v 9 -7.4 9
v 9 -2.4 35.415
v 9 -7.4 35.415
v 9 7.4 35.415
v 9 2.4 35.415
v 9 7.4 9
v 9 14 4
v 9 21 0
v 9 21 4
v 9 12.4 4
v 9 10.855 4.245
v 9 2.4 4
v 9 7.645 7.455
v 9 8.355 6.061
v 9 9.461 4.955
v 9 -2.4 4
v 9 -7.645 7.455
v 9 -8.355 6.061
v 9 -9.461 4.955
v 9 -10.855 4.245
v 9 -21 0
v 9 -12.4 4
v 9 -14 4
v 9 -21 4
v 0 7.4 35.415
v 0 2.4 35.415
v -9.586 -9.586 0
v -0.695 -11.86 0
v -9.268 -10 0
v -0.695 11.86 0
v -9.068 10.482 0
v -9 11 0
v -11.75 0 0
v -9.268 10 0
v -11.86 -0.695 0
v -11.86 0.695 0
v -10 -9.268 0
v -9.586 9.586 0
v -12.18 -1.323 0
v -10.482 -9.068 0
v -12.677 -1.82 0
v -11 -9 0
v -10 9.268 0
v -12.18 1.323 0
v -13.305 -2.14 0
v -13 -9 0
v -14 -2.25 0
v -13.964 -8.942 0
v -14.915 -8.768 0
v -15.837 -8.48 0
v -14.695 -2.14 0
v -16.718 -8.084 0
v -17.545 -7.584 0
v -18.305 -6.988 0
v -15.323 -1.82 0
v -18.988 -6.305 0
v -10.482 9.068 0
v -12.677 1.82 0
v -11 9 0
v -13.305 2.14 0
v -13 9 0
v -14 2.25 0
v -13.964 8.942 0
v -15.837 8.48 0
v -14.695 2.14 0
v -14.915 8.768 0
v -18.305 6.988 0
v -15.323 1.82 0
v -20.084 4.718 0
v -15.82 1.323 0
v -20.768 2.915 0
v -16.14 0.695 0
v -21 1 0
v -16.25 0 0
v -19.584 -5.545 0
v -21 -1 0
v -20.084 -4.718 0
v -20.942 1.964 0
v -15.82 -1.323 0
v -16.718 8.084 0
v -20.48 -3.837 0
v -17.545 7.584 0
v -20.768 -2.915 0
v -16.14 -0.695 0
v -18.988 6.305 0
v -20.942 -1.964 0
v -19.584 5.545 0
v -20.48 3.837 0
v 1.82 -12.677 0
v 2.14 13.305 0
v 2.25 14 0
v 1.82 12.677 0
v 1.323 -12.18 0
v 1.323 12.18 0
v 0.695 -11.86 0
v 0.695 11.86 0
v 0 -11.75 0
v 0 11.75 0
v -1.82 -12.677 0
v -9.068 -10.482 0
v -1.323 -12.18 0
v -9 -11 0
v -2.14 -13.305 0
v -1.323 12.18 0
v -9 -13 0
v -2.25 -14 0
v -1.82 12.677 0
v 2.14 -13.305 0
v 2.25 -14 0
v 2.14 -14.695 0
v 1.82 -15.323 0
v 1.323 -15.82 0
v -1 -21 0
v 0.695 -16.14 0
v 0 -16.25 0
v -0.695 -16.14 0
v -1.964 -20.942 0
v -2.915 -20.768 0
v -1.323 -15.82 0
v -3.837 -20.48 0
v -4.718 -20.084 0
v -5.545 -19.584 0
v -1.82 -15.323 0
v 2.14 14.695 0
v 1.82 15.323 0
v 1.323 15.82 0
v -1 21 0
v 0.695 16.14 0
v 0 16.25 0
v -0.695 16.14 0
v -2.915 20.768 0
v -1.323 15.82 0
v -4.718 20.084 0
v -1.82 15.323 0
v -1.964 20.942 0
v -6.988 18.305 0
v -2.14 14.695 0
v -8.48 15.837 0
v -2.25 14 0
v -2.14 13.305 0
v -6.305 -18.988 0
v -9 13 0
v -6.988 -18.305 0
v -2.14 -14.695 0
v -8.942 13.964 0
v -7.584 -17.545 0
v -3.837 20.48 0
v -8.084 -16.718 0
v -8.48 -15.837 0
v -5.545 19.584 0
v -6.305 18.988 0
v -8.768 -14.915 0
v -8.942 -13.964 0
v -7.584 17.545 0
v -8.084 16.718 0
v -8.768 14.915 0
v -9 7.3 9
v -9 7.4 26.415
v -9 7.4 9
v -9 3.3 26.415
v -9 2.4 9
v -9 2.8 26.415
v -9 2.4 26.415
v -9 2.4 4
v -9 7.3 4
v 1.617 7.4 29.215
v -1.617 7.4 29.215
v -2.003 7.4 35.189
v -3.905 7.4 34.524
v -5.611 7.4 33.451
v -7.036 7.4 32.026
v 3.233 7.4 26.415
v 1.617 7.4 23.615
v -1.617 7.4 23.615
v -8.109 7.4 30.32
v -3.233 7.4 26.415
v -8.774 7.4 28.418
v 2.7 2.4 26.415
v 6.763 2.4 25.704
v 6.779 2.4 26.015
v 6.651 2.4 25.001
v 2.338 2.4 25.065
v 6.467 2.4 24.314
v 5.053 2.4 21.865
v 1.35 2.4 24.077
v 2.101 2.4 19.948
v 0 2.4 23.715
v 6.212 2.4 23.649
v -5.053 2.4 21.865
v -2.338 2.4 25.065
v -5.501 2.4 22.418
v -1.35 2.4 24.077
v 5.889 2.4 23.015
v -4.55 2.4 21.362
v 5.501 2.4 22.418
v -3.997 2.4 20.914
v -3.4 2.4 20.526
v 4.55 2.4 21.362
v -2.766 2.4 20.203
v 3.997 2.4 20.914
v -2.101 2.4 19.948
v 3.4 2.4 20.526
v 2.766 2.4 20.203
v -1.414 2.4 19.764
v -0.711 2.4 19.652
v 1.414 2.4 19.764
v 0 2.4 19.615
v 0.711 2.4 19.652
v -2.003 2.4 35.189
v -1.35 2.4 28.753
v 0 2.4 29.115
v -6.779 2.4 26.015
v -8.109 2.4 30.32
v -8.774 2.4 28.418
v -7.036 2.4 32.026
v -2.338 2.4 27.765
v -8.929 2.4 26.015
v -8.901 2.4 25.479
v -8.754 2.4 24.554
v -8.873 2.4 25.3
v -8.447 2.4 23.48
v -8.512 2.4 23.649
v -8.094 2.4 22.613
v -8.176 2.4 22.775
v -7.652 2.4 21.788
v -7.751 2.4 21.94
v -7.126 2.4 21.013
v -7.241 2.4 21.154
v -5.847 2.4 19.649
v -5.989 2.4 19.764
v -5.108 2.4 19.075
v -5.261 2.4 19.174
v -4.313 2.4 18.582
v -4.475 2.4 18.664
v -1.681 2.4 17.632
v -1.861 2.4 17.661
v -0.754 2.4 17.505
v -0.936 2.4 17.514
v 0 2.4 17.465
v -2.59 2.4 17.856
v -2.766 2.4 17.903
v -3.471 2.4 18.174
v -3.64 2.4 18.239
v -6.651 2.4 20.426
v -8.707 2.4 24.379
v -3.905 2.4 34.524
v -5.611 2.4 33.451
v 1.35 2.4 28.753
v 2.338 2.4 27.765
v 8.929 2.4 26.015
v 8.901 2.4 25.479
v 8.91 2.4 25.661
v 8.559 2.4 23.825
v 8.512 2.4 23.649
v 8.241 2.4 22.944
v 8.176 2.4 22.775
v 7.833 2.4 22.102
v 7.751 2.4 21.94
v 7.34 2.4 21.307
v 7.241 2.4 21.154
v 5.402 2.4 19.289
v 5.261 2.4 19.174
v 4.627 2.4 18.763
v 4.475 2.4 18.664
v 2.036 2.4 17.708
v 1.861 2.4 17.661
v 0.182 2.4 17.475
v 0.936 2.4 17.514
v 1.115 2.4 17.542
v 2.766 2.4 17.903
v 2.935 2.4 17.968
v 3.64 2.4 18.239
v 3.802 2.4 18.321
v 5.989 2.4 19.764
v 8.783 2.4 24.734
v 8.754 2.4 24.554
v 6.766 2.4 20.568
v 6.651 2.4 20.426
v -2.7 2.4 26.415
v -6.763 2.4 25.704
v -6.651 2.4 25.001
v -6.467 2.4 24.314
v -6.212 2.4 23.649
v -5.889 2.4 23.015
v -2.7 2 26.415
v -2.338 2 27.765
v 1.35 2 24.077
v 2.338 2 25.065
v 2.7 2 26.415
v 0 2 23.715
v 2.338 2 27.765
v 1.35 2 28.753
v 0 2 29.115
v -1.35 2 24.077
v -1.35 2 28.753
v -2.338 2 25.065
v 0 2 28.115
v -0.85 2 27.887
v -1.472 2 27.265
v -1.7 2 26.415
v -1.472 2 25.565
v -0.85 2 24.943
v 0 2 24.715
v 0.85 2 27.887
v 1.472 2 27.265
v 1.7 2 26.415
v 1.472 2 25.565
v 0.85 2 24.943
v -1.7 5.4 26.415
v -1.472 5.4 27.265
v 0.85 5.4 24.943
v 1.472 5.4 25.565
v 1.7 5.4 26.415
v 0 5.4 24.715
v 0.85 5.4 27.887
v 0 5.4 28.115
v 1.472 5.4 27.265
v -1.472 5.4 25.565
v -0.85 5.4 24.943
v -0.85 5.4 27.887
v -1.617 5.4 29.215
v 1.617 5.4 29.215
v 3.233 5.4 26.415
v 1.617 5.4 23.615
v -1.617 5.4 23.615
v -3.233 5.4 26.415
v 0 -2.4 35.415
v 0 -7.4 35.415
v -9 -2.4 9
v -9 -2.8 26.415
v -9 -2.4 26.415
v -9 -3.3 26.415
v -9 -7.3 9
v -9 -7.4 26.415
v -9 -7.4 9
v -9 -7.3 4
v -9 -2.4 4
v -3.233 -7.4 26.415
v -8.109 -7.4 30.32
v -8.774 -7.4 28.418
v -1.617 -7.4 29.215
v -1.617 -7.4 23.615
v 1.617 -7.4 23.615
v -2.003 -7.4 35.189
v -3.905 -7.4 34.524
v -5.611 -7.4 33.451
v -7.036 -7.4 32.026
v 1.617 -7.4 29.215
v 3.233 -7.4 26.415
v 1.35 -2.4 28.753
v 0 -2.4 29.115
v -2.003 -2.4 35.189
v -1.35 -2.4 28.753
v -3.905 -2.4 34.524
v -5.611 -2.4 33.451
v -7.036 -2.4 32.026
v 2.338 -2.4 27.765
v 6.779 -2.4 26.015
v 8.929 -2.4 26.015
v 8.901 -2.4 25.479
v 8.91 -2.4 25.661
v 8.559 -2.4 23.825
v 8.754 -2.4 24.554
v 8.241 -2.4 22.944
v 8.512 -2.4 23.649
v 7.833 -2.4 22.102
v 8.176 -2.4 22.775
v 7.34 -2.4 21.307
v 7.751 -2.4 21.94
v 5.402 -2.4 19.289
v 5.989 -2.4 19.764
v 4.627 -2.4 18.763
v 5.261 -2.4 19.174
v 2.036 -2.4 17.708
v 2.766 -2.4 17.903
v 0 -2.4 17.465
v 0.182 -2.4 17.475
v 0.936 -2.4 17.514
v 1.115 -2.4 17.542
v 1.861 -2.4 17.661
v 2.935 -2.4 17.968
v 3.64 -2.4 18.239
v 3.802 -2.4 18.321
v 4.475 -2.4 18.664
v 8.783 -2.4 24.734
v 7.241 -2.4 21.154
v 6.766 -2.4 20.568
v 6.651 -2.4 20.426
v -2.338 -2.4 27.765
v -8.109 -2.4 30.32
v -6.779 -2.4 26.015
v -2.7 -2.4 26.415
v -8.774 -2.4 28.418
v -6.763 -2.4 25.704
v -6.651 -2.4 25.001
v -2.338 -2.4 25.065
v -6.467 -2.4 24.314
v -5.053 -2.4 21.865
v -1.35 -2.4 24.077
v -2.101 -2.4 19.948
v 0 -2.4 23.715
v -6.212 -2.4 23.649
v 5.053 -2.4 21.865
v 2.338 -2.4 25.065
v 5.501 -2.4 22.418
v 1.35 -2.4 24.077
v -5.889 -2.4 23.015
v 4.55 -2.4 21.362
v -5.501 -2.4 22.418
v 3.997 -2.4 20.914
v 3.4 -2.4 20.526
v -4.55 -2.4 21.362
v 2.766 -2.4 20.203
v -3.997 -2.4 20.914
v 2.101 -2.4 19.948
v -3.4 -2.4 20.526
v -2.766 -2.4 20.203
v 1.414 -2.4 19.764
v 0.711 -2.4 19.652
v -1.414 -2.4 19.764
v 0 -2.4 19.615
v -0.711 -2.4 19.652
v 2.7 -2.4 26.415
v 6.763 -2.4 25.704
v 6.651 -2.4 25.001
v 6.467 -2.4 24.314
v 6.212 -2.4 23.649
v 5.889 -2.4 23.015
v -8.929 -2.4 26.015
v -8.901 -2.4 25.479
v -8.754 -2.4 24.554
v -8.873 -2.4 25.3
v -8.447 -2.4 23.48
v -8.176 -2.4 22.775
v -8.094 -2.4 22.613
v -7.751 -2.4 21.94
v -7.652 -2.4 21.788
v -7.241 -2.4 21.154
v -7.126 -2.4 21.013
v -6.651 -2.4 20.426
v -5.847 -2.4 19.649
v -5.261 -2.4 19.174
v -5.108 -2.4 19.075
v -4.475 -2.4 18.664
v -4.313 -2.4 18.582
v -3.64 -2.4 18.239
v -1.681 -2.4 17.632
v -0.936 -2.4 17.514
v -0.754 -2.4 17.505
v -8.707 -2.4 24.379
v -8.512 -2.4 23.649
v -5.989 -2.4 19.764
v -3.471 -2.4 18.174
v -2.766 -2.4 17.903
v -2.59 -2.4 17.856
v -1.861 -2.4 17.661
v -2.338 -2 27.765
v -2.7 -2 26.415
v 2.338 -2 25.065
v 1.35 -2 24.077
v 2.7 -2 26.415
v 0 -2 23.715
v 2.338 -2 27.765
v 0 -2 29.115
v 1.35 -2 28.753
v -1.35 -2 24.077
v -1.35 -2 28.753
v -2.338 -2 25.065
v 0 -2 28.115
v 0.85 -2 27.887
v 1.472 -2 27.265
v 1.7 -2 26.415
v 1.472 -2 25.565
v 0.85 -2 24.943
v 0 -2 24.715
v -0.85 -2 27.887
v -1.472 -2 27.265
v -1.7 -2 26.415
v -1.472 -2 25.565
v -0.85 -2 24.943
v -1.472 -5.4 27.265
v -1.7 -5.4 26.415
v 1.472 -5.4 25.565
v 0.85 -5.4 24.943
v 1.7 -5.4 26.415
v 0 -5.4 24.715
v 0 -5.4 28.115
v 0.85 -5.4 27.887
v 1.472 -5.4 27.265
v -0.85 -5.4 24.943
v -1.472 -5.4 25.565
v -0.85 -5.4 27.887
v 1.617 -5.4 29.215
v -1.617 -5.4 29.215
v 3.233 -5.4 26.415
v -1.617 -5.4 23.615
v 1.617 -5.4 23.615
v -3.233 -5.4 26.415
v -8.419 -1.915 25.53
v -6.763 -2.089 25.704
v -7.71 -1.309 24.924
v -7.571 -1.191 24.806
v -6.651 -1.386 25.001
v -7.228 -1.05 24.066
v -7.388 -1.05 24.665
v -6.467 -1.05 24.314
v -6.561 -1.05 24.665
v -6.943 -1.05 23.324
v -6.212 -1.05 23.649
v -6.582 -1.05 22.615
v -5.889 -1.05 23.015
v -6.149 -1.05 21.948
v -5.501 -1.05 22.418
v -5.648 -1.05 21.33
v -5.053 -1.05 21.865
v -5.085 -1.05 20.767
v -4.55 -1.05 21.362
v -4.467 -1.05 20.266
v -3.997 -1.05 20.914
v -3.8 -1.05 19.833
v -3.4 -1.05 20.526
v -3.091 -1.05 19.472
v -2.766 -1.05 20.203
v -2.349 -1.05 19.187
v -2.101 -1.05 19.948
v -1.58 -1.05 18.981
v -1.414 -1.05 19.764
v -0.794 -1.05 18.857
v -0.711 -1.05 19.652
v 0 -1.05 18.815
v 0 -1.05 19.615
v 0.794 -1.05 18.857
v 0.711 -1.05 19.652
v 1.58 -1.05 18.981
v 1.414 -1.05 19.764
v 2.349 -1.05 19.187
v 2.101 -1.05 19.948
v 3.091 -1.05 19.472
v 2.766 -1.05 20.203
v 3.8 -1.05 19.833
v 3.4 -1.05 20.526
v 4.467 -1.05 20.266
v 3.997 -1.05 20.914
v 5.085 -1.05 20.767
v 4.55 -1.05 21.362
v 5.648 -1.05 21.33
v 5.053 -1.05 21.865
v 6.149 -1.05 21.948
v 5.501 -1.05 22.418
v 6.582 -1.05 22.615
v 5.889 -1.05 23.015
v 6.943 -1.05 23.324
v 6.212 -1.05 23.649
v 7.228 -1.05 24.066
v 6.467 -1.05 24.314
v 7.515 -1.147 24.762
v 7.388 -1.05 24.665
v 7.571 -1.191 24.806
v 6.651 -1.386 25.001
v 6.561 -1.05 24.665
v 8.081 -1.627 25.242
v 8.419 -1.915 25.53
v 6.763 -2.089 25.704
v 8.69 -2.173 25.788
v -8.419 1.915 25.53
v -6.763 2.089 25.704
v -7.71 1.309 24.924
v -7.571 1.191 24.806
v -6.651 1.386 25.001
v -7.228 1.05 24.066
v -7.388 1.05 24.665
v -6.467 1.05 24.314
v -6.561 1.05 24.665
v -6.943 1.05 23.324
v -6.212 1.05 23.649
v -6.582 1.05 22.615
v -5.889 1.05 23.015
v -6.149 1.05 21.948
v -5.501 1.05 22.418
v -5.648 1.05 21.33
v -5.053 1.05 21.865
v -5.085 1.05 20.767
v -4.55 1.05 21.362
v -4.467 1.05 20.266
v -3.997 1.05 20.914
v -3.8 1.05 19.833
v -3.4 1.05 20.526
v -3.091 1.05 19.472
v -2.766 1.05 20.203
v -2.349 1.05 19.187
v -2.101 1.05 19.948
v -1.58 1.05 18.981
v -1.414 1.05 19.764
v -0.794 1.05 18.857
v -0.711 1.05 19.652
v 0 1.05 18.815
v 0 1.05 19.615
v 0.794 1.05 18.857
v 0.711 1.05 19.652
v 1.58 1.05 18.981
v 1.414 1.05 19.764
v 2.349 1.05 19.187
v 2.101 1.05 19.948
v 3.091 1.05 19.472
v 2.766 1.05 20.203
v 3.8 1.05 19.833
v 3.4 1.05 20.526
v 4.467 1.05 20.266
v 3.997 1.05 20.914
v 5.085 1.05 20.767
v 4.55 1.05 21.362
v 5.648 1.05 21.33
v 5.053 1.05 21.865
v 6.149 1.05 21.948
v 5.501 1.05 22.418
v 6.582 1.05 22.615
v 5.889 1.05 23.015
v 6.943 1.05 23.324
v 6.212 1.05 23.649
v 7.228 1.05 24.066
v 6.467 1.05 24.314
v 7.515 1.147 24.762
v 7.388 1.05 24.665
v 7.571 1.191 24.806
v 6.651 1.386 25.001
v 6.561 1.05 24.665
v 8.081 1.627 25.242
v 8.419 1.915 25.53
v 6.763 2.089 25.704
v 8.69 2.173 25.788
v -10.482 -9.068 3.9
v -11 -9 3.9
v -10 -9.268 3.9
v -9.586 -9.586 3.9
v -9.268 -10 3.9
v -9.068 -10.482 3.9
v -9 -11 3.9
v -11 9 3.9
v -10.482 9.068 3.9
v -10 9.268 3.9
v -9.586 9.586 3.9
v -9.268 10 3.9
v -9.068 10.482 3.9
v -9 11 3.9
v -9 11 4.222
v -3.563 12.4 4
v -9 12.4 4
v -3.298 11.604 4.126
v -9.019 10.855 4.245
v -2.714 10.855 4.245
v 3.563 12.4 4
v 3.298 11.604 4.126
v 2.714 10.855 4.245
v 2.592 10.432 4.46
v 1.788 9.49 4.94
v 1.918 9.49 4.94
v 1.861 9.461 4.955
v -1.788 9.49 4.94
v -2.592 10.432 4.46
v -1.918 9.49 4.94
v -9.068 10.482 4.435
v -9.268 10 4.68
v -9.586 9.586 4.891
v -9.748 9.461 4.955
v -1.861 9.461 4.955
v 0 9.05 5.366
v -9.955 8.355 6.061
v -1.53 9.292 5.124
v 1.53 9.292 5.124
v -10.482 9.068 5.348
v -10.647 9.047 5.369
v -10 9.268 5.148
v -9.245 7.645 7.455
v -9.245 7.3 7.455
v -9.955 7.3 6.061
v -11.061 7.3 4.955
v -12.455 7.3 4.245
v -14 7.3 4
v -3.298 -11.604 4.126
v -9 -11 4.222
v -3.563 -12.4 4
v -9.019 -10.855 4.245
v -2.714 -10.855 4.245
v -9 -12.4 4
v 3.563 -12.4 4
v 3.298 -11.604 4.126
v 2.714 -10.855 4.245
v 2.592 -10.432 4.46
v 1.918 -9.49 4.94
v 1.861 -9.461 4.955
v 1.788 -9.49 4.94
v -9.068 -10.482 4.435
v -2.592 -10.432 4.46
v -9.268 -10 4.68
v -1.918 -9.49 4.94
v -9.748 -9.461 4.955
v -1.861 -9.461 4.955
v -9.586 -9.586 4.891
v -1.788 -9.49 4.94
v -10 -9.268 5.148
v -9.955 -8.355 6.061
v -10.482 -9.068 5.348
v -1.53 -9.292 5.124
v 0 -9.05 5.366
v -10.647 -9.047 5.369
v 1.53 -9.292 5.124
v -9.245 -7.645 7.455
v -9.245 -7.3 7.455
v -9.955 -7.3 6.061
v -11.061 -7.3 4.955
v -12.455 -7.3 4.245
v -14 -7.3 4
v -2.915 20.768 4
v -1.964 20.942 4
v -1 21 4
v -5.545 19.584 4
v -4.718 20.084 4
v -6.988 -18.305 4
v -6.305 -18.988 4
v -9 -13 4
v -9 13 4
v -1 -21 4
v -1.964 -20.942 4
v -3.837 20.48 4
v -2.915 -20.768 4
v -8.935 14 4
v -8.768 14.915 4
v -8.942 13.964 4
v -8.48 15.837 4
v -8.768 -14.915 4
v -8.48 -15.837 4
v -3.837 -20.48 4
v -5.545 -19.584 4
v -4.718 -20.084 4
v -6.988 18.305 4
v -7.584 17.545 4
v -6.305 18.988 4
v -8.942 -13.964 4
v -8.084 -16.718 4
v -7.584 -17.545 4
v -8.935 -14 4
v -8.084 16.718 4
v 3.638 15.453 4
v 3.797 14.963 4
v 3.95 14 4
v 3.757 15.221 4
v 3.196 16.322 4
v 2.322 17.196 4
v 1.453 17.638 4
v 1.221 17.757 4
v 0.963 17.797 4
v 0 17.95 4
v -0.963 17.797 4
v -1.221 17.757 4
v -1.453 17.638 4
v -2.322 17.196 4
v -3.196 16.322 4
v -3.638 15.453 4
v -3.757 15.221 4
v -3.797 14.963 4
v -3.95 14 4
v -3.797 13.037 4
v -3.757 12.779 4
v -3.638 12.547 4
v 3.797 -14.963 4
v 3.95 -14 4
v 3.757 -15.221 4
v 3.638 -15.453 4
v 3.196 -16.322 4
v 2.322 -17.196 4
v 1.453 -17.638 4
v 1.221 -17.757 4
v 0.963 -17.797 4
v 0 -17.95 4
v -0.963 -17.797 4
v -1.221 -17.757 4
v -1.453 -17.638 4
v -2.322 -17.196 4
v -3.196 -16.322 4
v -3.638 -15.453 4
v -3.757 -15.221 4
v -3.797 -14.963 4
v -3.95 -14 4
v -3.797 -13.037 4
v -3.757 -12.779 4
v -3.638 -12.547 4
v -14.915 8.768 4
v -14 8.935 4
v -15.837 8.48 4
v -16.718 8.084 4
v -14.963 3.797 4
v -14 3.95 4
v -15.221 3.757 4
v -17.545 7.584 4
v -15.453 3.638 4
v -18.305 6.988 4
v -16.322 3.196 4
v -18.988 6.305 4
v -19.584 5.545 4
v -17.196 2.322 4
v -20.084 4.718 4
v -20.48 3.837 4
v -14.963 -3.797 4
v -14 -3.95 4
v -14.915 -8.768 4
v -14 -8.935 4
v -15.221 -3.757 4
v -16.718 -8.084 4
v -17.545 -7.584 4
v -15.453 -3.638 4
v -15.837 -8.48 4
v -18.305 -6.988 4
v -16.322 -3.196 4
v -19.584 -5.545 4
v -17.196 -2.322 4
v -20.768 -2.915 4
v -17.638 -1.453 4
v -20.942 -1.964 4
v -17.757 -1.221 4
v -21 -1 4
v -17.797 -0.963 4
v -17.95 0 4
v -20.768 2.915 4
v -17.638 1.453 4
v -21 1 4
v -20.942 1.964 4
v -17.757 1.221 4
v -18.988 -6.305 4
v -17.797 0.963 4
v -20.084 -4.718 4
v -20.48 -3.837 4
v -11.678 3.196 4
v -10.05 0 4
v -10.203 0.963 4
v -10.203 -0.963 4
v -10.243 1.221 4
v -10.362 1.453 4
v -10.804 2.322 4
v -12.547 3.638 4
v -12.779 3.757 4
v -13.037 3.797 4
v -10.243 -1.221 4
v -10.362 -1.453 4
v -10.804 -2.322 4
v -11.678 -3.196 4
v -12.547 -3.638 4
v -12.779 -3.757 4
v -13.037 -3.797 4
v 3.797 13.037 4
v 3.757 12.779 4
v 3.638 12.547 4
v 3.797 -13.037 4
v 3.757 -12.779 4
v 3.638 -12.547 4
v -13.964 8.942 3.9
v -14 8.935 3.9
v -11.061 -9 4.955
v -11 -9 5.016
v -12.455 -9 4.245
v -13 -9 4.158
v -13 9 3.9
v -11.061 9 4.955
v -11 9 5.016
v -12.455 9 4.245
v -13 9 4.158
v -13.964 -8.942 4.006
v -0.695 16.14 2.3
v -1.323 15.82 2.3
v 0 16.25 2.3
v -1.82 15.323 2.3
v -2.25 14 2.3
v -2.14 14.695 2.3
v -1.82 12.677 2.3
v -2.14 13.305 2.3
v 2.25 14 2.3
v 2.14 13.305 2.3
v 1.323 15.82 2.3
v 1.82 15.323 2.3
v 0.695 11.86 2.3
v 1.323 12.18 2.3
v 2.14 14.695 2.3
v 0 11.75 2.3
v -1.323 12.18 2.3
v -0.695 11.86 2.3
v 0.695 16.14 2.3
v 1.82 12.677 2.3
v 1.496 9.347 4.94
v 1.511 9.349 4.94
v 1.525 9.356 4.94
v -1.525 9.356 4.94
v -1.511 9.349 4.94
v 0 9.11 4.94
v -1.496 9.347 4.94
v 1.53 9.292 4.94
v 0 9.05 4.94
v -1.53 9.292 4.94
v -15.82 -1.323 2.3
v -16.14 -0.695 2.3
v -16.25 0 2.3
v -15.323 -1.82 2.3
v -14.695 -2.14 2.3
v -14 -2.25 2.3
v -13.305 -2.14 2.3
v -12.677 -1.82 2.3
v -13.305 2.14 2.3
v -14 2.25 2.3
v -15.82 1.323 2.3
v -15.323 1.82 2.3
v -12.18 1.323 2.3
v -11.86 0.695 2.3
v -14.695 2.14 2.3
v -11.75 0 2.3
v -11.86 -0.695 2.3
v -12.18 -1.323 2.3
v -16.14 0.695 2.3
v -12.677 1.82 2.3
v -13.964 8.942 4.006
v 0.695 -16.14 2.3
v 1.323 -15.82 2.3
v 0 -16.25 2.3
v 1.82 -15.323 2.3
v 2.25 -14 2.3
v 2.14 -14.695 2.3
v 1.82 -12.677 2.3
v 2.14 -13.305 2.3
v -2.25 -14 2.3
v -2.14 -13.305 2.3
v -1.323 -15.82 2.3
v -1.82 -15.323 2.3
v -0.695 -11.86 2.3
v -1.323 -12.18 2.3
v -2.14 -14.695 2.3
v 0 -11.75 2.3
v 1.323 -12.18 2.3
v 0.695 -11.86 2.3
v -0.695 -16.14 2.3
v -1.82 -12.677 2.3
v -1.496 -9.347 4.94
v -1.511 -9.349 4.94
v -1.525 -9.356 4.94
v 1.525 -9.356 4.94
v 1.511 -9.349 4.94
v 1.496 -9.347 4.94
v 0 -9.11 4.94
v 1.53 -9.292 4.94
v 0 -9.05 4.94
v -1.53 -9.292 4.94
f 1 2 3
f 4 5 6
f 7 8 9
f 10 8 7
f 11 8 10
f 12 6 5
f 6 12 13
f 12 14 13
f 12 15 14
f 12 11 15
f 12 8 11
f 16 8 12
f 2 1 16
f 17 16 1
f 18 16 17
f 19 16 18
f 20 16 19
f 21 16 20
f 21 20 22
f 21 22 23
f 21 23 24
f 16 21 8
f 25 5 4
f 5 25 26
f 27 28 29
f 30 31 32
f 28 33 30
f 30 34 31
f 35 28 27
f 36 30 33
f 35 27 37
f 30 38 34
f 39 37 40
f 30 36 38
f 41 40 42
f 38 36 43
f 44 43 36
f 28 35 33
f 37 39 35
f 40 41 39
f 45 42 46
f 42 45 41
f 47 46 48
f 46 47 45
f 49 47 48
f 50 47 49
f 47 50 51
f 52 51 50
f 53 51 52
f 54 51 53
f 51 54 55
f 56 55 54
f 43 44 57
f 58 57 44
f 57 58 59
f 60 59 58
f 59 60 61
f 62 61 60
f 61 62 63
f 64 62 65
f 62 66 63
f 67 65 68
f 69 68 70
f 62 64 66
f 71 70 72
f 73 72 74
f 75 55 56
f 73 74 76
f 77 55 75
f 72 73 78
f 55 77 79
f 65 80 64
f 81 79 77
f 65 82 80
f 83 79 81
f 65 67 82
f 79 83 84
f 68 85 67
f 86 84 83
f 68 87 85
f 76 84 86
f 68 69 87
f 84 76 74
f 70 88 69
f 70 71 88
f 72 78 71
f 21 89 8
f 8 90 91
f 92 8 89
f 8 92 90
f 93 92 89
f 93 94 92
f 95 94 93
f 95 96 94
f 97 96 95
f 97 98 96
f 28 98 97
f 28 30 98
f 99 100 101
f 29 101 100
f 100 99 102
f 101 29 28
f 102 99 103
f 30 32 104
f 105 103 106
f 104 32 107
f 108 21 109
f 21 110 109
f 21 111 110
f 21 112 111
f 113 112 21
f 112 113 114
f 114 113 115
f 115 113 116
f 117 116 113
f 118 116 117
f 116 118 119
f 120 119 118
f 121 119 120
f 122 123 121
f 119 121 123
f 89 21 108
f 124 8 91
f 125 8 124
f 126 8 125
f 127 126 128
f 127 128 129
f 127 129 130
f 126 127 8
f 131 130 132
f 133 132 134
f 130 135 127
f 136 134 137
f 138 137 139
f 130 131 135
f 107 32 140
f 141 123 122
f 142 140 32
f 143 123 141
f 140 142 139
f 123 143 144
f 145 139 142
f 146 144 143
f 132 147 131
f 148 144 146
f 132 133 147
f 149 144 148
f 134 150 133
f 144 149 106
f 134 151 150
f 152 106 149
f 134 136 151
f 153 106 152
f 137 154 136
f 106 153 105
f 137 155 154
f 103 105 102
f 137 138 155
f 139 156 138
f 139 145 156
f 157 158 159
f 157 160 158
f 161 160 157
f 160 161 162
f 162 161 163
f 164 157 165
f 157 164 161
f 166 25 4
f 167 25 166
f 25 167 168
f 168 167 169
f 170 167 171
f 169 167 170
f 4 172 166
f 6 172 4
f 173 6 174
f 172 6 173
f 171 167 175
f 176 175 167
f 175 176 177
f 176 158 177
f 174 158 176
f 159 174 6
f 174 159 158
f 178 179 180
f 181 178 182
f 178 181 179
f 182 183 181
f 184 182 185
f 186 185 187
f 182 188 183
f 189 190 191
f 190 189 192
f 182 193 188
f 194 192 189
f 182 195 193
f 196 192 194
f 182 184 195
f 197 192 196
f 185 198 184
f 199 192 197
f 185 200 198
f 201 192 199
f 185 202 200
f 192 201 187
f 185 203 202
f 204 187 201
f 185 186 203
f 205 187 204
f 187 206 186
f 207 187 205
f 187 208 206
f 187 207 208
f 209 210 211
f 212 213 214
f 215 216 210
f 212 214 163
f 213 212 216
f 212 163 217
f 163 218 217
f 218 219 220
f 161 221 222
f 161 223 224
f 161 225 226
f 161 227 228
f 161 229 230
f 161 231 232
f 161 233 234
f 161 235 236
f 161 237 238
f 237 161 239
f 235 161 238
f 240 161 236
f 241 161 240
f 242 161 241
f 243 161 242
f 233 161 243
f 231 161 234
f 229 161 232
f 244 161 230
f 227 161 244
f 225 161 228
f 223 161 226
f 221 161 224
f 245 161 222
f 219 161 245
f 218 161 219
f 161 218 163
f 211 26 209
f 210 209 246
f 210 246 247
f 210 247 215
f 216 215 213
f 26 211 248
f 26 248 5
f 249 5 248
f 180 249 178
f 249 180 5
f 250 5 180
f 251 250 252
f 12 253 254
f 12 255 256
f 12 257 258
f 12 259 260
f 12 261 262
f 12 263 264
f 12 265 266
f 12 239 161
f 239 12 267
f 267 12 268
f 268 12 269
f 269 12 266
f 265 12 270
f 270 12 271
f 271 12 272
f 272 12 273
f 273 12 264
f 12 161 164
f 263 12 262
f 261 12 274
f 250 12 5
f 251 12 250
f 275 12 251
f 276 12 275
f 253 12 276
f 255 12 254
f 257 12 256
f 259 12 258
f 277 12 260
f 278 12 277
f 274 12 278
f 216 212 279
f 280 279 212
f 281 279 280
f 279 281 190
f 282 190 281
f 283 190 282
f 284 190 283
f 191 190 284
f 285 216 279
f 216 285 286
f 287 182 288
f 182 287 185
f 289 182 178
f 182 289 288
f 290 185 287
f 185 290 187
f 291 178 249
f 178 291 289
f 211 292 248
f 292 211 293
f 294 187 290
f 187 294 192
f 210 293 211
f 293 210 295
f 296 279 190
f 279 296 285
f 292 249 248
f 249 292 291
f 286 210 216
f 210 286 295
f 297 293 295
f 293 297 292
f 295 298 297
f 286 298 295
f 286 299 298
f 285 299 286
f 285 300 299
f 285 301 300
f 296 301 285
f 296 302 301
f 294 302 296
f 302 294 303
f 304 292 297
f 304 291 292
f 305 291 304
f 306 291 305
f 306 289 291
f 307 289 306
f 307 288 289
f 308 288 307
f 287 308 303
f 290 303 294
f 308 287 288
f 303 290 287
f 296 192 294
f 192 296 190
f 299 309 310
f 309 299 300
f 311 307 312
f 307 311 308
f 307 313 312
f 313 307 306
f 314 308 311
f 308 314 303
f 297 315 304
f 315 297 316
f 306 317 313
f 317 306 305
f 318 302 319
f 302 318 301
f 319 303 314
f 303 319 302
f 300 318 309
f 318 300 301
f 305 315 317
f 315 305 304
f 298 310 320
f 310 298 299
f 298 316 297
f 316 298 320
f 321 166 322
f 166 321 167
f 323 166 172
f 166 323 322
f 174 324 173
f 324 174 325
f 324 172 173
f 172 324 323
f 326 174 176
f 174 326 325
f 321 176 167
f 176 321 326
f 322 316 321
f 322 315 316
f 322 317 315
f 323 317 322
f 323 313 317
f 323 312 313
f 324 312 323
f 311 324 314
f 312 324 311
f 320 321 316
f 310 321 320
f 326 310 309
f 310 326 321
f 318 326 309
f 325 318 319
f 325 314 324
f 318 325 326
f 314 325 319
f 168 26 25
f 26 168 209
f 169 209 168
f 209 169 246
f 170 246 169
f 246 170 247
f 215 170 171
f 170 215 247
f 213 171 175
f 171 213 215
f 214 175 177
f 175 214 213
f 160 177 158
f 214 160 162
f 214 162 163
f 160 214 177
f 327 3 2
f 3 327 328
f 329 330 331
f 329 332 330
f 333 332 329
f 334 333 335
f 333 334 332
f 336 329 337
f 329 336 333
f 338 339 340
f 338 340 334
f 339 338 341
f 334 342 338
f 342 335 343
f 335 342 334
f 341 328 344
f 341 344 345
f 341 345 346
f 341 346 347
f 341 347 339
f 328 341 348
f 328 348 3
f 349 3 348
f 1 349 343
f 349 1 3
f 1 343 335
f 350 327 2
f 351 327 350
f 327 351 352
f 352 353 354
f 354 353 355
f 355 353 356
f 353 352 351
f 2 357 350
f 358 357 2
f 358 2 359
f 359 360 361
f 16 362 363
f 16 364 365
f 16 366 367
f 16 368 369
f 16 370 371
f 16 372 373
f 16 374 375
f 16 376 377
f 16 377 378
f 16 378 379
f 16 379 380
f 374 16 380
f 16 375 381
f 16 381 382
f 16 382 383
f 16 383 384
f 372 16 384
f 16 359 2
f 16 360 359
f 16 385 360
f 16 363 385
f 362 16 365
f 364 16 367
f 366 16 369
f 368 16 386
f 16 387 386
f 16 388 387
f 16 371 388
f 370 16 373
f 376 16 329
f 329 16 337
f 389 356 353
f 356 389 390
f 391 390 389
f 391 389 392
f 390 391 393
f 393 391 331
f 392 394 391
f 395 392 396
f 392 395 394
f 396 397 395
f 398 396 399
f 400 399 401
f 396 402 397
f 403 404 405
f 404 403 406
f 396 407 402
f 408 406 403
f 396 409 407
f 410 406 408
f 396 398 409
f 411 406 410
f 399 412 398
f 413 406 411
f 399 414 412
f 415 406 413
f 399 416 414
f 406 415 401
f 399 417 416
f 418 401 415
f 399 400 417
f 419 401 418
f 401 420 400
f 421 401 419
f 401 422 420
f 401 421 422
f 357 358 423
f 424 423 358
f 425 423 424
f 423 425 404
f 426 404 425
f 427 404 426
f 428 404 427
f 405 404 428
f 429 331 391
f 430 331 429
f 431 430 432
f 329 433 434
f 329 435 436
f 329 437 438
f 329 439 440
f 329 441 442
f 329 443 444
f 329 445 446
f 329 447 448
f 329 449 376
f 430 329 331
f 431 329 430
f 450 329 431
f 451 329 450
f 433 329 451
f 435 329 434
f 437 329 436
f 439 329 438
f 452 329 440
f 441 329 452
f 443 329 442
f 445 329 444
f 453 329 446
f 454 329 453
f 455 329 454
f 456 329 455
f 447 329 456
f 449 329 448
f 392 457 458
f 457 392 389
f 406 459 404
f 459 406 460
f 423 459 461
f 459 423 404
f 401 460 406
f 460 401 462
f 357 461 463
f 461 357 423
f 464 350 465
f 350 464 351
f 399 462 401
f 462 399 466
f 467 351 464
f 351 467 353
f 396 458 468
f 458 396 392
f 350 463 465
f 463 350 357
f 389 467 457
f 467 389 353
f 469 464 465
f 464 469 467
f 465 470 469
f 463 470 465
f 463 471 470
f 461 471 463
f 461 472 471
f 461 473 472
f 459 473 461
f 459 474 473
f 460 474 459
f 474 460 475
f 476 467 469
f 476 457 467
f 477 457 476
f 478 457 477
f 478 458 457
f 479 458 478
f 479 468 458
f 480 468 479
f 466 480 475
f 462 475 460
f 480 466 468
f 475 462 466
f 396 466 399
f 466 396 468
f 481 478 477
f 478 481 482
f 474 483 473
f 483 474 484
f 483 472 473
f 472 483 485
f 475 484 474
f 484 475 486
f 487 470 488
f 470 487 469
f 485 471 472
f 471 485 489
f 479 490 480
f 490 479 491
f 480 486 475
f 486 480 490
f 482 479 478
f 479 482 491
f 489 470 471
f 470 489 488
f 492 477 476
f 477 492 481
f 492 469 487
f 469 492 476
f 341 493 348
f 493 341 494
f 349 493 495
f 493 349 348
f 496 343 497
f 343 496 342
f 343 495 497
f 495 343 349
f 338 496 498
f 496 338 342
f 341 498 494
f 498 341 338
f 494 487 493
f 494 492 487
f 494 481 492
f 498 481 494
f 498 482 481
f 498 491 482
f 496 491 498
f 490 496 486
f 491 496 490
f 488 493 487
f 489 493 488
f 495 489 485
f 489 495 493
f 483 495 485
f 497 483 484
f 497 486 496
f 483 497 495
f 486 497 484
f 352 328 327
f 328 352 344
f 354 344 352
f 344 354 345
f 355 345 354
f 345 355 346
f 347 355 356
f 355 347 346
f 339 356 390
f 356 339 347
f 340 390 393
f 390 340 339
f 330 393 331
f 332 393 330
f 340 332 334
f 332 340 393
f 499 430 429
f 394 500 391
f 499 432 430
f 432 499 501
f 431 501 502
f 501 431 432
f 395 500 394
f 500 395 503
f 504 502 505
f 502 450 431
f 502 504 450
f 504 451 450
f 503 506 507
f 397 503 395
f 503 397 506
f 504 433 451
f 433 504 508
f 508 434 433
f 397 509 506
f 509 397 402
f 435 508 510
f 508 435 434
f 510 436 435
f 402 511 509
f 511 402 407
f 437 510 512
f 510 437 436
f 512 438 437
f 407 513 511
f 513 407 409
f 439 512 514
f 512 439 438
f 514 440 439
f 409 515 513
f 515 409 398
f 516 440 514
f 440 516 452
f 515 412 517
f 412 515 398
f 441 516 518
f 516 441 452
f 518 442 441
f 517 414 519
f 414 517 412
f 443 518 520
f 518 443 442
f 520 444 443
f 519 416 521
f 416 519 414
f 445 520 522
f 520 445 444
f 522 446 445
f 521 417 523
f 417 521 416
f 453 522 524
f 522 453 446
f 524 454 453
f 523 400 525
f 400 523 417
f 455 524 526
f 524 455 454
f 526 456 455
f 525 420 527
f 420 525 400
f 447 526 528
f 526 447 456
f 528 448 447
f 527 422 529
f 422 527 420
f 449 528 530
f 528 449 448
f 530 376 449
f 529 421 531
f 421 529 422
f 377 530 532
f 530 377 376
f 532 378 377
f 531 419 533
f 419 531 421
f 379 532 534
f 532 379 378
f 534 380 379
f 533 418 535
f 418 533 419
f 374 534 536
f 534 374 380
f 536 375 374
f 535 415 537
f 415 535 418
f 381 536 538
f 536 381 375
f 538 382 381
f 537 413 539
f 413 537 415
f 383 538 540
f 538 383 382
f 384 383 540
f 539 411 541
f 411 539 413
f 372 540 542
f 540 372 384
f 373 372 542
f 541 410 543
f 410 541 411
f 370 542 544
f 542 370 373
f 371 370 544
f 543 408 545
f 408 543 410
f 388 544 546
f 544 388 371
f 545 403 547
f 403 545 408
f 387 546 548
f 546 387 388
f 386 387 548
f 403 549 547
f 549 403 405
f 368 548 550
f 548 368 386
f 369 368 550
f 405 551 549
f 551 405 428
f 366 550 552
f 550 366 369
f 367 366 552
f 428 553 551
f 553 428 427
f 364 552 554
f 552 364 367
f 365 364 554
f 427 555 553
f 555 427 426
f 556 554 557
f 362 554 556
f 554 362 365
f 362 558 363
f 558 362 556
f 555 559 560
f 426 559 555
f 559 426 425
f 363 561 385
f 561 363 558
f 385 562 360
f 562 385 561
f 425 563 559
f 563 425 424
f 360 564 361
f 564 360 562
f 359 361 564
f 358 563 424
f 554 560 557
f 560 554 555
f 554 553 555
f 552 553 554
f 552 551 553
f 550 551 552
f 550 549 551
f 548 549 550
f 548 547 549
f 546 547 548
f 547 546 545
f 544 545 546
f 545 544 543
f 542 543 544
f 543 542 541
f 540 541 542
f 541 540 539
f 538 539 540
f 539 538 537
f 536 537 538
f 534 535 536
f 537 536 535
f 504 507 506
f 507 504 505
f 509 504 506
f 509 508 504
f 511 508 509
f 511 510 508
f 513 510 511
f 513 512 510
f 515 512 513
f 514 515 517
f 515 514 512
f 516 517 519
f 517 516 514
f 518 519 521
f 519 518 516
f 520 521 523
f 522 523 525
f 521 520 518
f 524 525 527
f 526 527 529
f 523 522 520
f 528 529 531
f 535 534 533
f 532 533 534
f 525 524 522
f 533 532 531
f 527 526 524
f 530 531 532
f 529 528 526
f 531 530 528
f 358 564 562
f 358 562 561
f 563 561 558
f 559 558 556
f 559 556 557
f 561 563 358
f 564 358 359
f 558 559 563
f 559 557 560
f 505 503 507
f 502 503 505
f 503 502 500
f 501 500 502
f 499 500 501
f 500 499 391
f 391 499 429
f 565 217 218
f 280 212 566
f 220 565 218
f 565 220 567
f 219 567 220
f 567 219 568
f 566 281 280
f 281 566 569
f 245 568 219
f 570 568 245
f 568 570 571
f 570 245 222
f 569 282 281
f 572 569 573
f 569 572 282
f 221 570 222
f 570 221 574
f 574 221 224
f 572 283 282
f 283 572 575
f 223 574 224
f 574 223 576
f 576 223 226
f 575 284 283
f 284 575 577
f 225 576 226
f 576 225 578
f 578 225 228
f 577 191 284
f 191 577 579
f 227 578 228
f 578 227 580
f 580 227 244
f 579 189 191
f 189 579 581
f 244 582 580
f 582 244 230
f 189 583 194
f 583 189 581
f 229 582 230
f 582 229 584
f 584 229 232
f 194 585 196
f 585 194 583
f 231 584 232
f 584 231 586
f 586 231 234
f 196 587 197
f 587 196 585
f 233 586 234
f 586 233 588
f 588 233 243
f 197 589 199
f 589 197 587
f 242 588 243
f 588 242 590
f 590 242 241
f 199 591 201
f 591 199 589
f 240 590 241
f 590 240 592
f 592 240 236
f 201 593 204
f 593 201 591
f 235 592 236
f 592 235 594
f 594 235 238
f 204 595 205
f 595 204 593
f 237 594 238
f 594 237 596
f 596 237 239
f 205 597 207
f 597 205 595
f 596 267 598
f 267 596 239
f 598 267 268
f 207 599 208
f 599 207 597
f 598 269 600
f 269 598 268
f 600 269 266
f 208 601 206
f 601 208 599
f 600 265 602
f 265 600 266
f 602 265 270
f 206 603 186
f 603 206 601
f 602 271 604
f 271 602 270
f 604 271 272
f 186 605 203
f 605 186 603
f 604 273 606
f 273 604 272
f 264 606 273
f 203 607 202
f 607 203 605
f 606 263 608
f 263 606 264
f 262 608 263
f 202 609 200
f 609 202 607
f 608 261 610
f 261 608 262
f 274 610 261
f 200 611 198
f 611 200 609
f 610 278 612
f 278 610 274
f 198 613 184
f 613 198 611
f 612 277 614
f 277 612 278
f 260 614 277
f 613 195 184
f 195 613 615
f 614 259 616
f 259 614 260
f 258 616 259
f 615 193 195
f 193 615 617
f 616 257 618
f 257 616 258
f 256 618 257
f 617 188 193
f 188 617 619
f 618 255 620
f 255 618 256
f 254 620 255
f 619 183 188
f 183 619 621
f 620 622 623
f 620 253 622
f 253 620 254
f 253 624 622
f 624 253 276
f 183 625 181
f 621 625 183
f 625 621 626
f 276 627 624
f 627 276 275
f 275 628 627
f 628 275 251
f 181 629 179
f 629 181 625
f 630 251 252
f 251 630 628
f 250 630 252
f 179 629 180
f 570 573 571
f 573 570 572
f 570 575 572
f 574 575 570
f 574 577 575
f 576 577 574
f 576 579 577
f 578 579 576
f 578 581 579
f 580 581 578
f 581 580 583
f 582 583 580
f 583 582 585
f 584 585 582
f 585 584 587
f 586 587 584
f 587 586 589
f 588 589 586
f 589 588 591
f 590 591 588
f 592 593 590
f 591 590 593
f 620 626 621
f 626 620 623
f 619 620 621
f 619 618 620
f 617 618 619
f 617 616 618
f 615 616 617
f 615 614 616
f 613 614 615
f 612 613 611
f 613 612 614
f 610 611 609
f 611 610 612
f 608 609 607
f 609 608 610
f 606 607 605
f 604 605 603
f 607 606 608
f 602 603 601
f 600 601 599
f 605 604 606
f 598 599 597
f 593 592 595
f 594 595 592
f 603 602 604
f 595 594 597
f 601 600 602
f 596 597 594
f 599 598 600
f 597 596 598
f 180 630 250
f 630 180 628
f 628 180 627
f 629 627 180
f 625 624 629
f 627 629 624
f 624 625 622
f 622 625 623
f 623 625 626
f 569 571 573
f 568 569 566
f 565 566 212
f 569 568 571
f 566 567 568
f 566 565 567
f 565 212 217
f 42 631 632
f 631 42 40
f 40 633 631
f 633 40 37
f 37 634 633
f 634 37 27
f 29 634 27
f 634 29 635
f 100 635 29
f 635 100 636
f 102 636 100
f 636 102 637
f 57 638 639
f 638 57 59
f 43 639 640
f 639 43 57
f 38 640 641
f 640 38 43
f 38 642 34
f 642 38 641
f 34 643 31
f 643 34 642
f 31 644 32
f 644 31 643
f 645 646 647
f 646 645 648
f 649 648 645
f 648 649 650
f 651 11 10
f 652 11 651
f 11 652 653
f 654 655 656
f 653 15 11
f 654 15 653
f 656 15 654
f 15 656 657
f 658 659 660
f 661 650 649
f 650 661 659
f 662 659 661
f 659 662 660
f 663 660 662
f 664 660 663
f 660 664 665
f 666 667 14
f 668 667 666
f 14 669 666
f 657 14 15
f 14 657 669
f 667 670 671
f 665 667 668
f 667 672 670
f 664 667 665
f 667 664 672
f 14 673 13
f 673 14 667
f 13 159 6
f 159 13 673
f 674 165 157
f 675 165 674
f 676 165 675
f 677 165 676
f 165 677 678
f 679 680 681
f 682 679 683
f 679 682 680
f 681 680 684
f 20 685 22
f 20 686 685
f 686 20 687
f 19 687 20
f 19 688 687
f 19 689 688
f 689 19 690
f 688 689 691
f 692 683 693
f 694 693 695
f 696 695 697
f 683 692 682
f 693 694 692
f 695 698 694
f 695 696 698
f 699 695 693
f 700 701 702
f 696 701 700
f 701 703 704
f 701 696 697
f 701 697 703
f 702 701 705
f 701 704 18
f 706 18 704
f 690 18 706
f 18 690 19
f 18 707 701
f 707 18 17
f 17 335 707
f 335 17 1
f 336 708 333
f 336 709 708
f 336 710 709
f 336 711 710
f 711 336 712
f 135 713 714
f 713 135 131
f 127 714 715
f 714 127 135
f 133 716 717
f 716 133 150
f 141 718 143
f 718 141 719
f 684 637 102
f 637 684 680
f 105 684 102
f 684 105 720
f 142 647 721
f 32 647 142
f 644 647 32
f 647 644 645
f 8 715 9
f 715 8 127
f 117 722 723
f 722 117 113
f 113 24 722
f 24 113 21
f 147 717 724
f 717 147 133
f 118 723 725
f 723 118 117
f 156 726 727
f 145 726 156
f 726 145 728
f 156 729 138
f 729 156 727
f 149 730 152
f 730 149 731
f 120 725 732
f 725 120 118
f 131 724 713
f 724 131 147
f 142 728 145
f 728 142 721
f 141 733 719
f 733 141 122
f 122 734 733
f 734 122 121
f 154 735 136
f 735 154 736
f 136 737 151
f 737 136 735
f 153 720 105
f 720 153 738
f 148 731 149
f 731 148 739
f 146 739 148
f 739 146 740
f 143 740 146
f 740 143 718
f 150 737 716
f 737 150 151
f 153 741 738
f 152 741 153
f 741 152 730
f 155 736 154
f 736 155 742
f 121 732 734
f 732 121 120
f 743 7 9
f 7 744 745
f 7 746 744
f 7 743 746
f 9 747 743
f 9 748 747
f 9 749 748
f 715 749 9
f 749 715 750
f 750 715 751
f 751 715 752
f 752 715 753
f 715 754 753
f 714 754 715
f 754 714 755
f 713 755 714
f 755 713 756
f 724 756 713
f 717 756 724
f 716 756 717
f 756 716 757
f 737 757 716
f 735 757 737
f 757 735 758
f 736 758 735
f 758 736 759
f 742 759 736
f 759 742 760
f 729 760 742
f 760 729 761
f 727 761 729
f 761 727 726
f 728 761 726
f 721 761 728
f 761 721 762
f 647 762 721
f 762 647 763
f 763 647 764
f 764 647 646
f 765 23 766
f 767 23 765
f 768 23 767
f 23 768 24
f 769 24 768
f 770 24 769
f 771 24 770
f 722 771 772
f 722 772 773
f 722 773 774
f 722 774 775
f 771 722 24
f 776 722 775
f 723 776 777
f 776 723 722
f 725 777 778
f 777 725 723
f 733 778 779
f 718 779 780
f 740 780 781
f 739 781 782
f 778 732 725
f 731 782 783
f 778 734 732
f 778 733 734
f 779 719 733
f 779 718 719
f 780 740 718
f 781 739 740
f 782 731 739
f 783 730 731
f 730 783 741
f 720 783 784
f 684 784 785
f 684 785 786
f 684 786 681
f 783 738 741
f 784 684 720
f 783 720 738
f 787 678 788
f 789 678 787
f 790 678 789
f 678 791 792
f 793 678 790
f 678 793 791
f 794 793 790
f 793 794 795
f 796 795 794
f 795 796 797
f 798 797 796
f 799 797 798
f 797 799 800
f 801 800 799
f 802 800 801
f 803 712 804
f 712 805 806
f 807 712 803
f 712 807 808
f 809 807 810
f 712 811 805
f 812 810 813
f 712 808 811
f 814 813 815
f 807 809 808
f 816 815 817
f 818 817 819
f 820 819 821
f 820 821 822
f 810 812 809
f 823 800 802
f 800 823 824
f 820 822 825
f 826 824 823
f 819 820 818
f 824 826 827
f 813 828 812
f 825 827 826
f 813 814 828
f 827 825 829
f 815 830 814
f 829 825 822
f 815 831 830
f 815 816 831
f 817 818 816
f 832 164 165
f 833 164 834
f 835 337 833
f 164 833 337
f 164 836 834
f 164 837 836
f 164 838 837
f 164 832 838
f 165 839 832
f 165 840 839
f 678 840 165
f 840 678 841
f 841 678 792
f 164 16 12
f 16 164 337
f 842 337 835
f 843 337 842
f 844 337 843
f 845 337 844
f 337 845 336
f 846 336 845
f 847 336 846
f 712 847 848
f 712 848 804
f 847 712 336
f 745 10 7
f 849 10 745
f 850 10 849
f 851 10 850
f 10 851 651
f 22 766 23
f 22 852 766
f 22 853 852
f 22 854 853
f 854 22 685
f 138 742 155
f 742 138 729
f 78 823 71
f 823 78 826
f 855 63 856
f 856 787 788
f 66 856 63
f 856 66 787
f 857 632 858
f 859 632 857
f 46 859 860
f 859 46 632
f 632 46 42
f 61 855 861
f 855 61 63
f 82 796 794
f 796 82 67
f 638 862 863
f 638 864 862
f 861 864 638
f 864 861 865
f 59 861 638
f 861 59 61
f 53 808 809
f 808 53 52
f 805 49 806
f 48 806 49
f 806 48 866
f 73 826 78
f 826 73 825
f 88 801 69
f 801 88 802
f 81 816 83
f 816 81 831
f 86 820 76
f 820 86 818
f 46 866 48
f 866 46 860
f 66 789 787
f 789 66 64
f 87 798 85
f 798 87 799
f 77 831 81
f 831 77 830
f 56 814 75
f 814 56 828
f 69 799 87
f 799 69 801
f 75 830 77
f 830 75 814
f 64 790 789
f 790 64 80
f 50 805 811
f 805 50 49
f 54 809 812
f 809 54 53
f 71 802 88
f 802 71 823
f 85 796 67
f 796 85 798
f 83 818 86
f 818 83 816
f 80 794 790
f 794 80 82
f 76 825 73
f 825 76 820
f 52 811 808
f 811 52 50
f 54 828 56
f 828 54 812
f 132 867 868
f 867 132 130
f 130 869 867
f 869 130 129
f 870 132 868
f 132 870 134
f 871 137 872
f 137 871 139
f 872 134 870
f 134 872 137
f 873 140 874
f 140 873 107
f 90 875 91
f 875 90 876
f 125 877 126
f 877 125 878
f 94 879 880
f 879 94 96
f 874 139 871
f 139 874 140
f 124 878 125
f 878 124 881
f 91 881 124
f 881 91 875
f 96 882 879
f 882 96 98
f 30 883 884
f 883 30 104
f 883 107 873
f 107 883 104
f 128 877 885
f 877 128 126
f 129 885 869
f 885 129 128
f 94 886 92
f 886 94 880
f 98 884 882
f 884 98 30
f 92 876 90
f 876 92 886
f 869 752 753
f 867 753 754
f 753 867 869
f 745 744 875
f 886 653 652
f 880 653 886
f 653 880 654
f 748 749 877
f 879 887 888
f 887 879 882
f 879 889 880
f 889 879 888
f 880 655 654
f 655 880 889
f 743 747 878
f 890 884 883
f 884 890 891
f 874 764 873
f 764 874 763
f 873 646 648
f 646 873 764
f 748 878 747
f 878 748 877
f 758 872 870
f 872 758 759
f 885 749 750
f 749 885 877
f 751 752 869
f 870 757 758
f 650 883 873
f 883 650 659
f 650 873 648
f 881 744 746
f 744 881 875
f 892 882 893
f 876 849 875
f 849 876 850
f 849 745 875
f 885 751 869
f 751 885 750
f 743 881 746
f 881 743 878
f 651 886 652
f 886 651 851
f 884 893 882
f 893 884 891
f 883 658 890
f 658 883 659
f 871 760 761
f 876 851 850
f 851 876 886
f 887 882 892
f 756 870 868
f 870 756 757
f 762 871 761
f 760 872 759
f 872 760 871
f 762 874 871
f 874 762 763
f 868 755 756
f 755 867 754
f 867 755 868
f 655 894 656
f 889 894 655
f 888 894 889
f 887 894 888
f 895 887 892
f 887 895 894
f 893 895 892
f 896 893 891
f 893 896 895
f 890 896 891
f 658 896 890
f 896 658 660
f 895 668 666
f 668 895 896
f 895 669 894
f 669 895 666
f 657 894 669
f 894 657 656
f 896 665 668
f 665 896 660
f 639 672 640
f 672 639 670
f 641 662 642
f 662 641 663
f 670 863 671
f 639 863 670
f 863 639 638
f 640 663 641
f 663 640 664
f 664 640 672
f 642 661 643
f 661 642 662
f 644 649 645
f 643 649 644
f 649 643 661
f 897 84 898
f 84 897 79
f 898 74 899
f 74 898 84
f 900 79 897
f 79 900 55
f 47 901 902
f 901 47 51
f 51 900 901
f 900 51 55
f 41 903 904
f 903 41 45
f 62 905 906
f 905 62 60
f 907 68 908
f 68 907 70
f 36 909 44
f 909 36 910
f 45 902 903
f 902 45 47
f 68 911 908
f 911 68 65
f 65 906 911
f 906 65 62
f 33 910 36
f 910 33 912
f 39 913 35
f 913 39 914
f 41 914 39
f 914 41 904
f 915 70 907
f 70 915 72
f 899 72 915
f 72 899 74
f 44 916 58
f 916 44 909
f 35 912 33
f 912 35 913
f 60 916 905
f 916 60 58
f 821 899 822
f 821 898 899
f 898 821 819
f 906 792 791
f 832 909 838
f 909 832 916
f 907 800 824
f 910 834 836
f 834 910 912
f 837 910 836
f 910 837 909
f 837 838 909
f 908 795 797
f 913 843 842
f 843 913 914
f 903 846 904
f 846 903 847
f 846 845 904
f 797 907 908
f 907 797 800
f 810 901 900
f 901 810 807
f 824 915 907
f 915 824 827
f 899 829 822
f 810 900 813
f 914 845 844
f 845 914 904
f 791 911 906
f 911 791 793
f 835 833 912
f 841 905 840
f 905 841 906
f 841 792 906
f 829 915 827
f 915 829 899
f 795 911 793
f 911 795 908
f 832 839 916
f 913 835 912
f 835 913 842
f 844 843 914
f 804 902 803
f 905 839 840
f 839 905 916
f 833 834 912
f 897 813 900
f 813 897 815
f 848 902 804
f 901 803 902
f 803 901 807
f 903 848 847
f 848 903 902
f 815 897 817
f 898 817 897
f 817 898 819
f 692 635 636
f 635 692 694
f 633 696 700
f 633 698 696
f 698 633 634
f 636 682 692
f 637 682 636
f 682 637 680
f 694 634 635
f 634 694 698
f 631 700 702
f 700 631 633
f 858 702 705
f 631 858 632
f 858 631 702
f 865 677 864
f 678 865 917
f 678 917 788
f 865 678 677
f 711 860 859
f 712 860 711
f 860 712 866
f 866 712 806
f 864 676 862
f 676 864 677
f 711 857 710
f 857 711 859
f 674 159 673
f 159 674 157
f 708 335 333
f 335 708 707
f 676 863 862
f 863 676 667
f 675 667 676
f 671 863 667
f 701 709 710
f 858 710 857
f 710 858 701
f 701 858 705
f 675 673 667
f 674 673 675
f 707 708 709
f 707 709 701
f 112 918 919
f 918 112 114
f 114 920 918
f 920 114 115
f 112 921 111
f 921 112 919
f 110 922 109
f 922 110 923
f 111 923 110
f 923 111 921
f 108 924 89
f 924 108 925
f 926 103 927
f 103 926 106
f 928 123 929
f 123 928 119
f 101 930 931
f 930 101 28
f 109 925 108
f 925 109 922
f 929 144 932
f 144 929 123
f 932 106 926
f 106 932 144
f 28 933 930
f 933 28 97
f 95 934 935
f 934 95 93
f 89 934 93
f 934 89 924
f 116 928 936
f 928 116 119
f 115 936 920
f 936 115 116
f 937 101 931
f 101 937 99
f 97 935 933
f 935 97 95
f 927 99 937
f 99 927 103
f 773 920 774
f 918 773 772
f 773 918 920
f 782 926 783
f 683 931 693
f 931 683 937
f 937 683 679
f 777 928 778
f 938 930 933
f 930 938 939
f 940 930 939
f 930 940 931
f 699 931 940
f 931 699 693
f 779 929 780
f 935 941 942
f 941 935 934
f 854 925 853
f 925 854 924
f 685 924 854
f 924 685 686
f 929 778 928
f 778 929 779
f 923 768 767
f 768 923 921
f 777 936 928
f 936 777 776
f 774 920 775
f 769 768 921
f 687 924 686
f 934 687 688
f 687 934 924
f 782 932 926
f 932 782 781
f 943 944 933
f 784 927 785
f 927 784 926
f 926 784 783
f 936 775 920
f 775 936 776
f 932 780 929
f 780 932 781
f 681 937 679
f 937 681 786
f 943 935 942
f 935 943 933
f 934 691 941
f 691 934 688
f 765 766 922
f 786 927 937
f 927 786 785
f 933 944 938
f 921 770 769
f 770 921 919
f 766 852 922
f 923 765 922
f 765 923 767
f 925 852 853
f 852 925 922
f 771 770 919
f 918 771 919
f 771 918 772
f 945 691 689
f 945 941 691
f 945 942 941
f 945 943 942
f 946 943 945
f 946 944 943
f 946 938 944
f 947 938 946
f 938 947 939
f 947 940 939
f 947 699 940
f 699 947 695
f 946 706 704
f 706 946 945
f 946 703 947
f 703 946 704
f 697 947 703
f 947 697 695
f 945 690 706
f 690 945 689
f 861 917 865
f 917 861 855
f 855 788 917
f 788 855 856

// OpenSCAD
// file: parameters.scad
// Parameters shared between modules
Base_th = 4;
Beam_width = 15;
Wiggle = 0.25;
Fat_beam_width = Beam_width + Wiggle;
Beam_length = 400;
Wall_th = 2.5;
Min_beam_width = 12.5;
Max_beam_width = 17.5;
Zip_th = 2;
Zip_h = Zip_th + Max_beam_width - Min_beam_width;
Zip_w = 5.0;
Nema17_cube_width          = 42.43;
Nema17_screw_hole_width    = 43.74; // Opposite corner screws
Nema17_ring_diameter       = 22;
Nema17_cube_height         = 39.36;
Nema17_shaft_height        = 63.65;
Nema17_ring_height         = 2;
Nema17_shaft_radius        = 5/2;
b608_outer_dia = 22.2;
b608_width = 7.05;
b608_bore_r = 4;
Gap_between_sandwich_and_plate = 1.5 + Base_th; // 1.5 mm for wiggle
Motor_bracket_flerp_r = 6;
Motor_bracket_flerp = 14;
Motor_bracket_cw = Nema17_cube_width + 6;
Motor_bracket_att_ang = 50;
Mounting_screw_d = 4.5;
Mounting_screw_head_d = 14;
Spool_outer_wall_th = 4;

// Corner clamp parameters
Cc_l1 = (Fat_beam_width+2*Wall_th)*2*sqrt(3);
Cc_rad_b = 4;
Cc_action_point_from_mid = Cc_l1/sqrt(3)-2*Cc_rad_b-1.3;  // 1.3 chosen arbitrarily
Cc_plastic_length = sqrt(Cc_action_point_from_mid*Cc_action_point_from_mid
                       - (Cc_action_point_from_mid/2)*(Cc_action_point_from_mid/2));

// The distance between the two action points on the mover
Sidelength = Beam_length + 2*Cc_plastic_length;

/////// Layout parameters ////////////
Ext_sidelength = Sidelength+77;
Additional_added_plate_side_length = 10;
Yshift_top_plate = -25;

/////// Gear parameters ////////////
Circular_pitch = 262;
Motor_teeth = 10;
Gear_height = 21.4-3;
Motor_pitch                      = (Motor_teeth*Circular_pitch/360);
Motor_pitch_diametrial           = Motor_teeth/(2*Motor_pitch);
Motor_outer_radius               = Motor_pitch + 1/Motor_pitch_diametrial;
Spool_teeth = 100;
Spool_r = 65;
Spool_height = 8;
Spool_pitch                      = (Spool_teeth*Circular_pitch/360);
Spool_pitch_diametrial           = Spool_teeth/(2*Spool_pitch);
Spool_outer_radius               = Spool_pitch + 1/Spool_pitch_diametrial;
Sep_disc_radius = 161.83/2; // Made to match 255 teeth gt2 pulley
Motor_bracket_depth = Gear_height+1+7+Nema17_ring_height+1+Gap_between_sandwich_and_plate;
Spool_core_flerp0 = 16+3;

/////// Lineroller parameters ////////////
b623_width  = 4;
b623_bore_r = 3/2;
b623_vgroove_big_r = 12/2;
b623_vgroove_small_r = 10/2;
b623_outer_dia = 10;

Depth_of_roller_base = 18;
Roller_flerp = 6;
Roller_l = 42;
Roller_fl = (Roller_l - Depth_of_roller_base)/2;
Roller_wall_w = 5;

Line_roller_ABC_winch_h =  Gap_between_sandwich_and_plate
                           + Sep_disc_radius
                           - Spool_r
                           + Depth_of_roller_base/2
                           + b623_vgroove_small_r;


Ptfe_r = 2.1;
Roller_base_r = 8;
Screw_h = 2;
Screw_head_h = 2;
Spool_center_bearing_wall_th = 5;
Corner_clamp_bearings_center_to_center = 15;
Anchor_bearings_center_to_center = Corner_clamp_bearings_center_to_center + b623_outer_dia;

//// Lineroller anchor parameters /////

Bearing_wall = 1;
Bearing_0_x = 2*b623_vgroove_big_r+Bearing_wall+5.3;
Bearing_1_x = b623_vgroove_small_r-0.9;
Move_tower = -12.2;
Lower_bearing_z = 13;
Higher_bearing_z = Lower_bearing_z + Corner_clamp_bearings_center_to_center;

//// Cable Clamp parameters /////
Bit_width = 12;
Cable_r=2.5;


//// Donkey and encoder parameters /////

Donkey_shaft_d = 6;
Donkey_h = 65.12;
Donkey_body_d = 50;
Donkey_feet_th = 3.5;

Encoder_LDP3806_shaft_d = 6;
Encoder_LDP3806_d = 38;

// Belt drive parameters
GT2_belt_width = 6;
GT2_gear_height = GT2_belt_width + 2;
GT2_motor_gear_height = 16;
GT2_motor_gear_outer_dia = 16;
GT2_spool_gear_teeth = 255;
GT2_motor_gear_teeth = 20;
Torx_depth = GT2_gear_height/2;
Belt_roller_h = 47;

// Spacer parameters
Sandwich_ABC_width = 2*(1+Spool_height) + GT2_gear_height;
Sandwich_D_width = 3*(1+Spool_height) + GT2_gear_height;

Spacer_ABC_width = Sandwich_ABC_width - 2*b608_width;
Spacer_D_width = Sandwich_D_width -2*b608_width;


spd = Spool_height+GT2_gear_height;
// Horizontal_deflector_cube_y_size must be exact this number
// because we want to deflect AB-lines
// 60 degrees on the ceiling unit, and we want to put two
// deflectors in a row and get a distance between bearings
// that maintain the distance d when deflecting 60 degrees
Horizontal_deflector_cube_y_size = (2/sqrt(3))*spd;
// main file
include <parameters.scad>
use <util.scad>

space_between_walls = b623_width + 0.8;
wall_th = (Depth_of_roller_base - space_between_walls)/2;
l = Roller_l;

line_roller_single();
module line_roller_single(twod=false, tower_h = Line_roller_ABC_winch_h, edge_stop=180, with_bearing=false){
  if(with_bearing){
    translate([0,0,tower_h-Depth_of_roller_base/2])
      rotate([90,0,0])
      difference(){
        b623_vgroove();
        cylinder(r=1.6, h=40, center=true); // Screw hole in vgroove bearing
      }
  }
  wall_w = Roller_wall_w;
  difference(){
    union(){
      roller_wall(space_between_walls, wall_w, tower_h);
      mirror([0,1,0])
        roller_wall(space_between_walls, wall_w, tower_h);
      preventor_edges(tower_h, space_between_walls, edge_stop=edge_stop);
      //roller_base();
      // Custom base
      translate([-Depth_of_roller_base/2, -Roller_l/2, 0])
        left_rounded_cube2([Depth_of_roller_base, Roller_l, Base_th], r=8,
                           $fn=13*4);
      translate([-Depth_of_roller_base/2-Roller_fl,-Depth_of_roller_base/2,0])
        left_rounded_cube2([Depth_of_roller_base+Roller_fl, Depth_of_roller_base, Base_th], r=8,
                         $fn=13*4);

      for(k=[0,1])
        mirror([0,k,0])
          translate([-Depth_of_roller_base/2,-Depth_of_roller_base/2, 0])
          rotate([0,0,180])
          inner_round_corner(r=2, h=Base_th, $fn=6*4); // Fillet
      for(k=[0,1])
        mirror([0,k,0])
          translate([0,space_between_walls/2 + wall_w, Base_th])
          rotate([90,0,90])
          translate([0,0,-(Depth_of_roller_base+10)/2])
          inner_round_corner(h=Depth_of_roller_base+10, r=5, back=0.1, $fn=4*5);
    }
    translate([Depth_of_roller_base/2, -50/2])
      cube([10,50,50]);
    for(ang=[0:90:359])
      rotate([0,0,ang]){
        translate([14,0,2.3])
        Mounting_screw_countersink();
      translate([Depth_of_roller_base/2+5,0,5+Base_th])
        rotate([90,0,0])
        cylinder(r=5, h=50, center=true,$fn=4*5);
      translate([Depth_of_roller_base/2+2, Depth_of_roller_base/2+2,-1]){
        cylinder(r=2, h=Base_th+5, $fn=4*6);
        translate([0,-2,0])
          cube([10, 4, Base_th+5]);
        translate([-2,0,0])
          cube([4, 10, Base_th+5]);
      }
    }
    for(k=[0,1])
      mirror([0,k,0])
      translate([-Roller_l/2,-Depth_of_roller_base/2,-1])
      rotate([0,0,0])
      inner_round_corner(r=8, h=Base_th+3,$fn=4*13);
    //translate([Depth_of_roller_base/2+2, Depth_of_roller_base/2+2,-1])

    //translate([Depth_of_roller_base/2,space_between_walls/2+wall_w,Base_th])
    //  corner_rounder(0, 5, [20,20]);
  }

  //if(!twod){
  //  roller_wall_pair(space_between_walls, 5, tower_h);
  //  preventor_edges(tower_h, space_between_walls);
  //}
}
